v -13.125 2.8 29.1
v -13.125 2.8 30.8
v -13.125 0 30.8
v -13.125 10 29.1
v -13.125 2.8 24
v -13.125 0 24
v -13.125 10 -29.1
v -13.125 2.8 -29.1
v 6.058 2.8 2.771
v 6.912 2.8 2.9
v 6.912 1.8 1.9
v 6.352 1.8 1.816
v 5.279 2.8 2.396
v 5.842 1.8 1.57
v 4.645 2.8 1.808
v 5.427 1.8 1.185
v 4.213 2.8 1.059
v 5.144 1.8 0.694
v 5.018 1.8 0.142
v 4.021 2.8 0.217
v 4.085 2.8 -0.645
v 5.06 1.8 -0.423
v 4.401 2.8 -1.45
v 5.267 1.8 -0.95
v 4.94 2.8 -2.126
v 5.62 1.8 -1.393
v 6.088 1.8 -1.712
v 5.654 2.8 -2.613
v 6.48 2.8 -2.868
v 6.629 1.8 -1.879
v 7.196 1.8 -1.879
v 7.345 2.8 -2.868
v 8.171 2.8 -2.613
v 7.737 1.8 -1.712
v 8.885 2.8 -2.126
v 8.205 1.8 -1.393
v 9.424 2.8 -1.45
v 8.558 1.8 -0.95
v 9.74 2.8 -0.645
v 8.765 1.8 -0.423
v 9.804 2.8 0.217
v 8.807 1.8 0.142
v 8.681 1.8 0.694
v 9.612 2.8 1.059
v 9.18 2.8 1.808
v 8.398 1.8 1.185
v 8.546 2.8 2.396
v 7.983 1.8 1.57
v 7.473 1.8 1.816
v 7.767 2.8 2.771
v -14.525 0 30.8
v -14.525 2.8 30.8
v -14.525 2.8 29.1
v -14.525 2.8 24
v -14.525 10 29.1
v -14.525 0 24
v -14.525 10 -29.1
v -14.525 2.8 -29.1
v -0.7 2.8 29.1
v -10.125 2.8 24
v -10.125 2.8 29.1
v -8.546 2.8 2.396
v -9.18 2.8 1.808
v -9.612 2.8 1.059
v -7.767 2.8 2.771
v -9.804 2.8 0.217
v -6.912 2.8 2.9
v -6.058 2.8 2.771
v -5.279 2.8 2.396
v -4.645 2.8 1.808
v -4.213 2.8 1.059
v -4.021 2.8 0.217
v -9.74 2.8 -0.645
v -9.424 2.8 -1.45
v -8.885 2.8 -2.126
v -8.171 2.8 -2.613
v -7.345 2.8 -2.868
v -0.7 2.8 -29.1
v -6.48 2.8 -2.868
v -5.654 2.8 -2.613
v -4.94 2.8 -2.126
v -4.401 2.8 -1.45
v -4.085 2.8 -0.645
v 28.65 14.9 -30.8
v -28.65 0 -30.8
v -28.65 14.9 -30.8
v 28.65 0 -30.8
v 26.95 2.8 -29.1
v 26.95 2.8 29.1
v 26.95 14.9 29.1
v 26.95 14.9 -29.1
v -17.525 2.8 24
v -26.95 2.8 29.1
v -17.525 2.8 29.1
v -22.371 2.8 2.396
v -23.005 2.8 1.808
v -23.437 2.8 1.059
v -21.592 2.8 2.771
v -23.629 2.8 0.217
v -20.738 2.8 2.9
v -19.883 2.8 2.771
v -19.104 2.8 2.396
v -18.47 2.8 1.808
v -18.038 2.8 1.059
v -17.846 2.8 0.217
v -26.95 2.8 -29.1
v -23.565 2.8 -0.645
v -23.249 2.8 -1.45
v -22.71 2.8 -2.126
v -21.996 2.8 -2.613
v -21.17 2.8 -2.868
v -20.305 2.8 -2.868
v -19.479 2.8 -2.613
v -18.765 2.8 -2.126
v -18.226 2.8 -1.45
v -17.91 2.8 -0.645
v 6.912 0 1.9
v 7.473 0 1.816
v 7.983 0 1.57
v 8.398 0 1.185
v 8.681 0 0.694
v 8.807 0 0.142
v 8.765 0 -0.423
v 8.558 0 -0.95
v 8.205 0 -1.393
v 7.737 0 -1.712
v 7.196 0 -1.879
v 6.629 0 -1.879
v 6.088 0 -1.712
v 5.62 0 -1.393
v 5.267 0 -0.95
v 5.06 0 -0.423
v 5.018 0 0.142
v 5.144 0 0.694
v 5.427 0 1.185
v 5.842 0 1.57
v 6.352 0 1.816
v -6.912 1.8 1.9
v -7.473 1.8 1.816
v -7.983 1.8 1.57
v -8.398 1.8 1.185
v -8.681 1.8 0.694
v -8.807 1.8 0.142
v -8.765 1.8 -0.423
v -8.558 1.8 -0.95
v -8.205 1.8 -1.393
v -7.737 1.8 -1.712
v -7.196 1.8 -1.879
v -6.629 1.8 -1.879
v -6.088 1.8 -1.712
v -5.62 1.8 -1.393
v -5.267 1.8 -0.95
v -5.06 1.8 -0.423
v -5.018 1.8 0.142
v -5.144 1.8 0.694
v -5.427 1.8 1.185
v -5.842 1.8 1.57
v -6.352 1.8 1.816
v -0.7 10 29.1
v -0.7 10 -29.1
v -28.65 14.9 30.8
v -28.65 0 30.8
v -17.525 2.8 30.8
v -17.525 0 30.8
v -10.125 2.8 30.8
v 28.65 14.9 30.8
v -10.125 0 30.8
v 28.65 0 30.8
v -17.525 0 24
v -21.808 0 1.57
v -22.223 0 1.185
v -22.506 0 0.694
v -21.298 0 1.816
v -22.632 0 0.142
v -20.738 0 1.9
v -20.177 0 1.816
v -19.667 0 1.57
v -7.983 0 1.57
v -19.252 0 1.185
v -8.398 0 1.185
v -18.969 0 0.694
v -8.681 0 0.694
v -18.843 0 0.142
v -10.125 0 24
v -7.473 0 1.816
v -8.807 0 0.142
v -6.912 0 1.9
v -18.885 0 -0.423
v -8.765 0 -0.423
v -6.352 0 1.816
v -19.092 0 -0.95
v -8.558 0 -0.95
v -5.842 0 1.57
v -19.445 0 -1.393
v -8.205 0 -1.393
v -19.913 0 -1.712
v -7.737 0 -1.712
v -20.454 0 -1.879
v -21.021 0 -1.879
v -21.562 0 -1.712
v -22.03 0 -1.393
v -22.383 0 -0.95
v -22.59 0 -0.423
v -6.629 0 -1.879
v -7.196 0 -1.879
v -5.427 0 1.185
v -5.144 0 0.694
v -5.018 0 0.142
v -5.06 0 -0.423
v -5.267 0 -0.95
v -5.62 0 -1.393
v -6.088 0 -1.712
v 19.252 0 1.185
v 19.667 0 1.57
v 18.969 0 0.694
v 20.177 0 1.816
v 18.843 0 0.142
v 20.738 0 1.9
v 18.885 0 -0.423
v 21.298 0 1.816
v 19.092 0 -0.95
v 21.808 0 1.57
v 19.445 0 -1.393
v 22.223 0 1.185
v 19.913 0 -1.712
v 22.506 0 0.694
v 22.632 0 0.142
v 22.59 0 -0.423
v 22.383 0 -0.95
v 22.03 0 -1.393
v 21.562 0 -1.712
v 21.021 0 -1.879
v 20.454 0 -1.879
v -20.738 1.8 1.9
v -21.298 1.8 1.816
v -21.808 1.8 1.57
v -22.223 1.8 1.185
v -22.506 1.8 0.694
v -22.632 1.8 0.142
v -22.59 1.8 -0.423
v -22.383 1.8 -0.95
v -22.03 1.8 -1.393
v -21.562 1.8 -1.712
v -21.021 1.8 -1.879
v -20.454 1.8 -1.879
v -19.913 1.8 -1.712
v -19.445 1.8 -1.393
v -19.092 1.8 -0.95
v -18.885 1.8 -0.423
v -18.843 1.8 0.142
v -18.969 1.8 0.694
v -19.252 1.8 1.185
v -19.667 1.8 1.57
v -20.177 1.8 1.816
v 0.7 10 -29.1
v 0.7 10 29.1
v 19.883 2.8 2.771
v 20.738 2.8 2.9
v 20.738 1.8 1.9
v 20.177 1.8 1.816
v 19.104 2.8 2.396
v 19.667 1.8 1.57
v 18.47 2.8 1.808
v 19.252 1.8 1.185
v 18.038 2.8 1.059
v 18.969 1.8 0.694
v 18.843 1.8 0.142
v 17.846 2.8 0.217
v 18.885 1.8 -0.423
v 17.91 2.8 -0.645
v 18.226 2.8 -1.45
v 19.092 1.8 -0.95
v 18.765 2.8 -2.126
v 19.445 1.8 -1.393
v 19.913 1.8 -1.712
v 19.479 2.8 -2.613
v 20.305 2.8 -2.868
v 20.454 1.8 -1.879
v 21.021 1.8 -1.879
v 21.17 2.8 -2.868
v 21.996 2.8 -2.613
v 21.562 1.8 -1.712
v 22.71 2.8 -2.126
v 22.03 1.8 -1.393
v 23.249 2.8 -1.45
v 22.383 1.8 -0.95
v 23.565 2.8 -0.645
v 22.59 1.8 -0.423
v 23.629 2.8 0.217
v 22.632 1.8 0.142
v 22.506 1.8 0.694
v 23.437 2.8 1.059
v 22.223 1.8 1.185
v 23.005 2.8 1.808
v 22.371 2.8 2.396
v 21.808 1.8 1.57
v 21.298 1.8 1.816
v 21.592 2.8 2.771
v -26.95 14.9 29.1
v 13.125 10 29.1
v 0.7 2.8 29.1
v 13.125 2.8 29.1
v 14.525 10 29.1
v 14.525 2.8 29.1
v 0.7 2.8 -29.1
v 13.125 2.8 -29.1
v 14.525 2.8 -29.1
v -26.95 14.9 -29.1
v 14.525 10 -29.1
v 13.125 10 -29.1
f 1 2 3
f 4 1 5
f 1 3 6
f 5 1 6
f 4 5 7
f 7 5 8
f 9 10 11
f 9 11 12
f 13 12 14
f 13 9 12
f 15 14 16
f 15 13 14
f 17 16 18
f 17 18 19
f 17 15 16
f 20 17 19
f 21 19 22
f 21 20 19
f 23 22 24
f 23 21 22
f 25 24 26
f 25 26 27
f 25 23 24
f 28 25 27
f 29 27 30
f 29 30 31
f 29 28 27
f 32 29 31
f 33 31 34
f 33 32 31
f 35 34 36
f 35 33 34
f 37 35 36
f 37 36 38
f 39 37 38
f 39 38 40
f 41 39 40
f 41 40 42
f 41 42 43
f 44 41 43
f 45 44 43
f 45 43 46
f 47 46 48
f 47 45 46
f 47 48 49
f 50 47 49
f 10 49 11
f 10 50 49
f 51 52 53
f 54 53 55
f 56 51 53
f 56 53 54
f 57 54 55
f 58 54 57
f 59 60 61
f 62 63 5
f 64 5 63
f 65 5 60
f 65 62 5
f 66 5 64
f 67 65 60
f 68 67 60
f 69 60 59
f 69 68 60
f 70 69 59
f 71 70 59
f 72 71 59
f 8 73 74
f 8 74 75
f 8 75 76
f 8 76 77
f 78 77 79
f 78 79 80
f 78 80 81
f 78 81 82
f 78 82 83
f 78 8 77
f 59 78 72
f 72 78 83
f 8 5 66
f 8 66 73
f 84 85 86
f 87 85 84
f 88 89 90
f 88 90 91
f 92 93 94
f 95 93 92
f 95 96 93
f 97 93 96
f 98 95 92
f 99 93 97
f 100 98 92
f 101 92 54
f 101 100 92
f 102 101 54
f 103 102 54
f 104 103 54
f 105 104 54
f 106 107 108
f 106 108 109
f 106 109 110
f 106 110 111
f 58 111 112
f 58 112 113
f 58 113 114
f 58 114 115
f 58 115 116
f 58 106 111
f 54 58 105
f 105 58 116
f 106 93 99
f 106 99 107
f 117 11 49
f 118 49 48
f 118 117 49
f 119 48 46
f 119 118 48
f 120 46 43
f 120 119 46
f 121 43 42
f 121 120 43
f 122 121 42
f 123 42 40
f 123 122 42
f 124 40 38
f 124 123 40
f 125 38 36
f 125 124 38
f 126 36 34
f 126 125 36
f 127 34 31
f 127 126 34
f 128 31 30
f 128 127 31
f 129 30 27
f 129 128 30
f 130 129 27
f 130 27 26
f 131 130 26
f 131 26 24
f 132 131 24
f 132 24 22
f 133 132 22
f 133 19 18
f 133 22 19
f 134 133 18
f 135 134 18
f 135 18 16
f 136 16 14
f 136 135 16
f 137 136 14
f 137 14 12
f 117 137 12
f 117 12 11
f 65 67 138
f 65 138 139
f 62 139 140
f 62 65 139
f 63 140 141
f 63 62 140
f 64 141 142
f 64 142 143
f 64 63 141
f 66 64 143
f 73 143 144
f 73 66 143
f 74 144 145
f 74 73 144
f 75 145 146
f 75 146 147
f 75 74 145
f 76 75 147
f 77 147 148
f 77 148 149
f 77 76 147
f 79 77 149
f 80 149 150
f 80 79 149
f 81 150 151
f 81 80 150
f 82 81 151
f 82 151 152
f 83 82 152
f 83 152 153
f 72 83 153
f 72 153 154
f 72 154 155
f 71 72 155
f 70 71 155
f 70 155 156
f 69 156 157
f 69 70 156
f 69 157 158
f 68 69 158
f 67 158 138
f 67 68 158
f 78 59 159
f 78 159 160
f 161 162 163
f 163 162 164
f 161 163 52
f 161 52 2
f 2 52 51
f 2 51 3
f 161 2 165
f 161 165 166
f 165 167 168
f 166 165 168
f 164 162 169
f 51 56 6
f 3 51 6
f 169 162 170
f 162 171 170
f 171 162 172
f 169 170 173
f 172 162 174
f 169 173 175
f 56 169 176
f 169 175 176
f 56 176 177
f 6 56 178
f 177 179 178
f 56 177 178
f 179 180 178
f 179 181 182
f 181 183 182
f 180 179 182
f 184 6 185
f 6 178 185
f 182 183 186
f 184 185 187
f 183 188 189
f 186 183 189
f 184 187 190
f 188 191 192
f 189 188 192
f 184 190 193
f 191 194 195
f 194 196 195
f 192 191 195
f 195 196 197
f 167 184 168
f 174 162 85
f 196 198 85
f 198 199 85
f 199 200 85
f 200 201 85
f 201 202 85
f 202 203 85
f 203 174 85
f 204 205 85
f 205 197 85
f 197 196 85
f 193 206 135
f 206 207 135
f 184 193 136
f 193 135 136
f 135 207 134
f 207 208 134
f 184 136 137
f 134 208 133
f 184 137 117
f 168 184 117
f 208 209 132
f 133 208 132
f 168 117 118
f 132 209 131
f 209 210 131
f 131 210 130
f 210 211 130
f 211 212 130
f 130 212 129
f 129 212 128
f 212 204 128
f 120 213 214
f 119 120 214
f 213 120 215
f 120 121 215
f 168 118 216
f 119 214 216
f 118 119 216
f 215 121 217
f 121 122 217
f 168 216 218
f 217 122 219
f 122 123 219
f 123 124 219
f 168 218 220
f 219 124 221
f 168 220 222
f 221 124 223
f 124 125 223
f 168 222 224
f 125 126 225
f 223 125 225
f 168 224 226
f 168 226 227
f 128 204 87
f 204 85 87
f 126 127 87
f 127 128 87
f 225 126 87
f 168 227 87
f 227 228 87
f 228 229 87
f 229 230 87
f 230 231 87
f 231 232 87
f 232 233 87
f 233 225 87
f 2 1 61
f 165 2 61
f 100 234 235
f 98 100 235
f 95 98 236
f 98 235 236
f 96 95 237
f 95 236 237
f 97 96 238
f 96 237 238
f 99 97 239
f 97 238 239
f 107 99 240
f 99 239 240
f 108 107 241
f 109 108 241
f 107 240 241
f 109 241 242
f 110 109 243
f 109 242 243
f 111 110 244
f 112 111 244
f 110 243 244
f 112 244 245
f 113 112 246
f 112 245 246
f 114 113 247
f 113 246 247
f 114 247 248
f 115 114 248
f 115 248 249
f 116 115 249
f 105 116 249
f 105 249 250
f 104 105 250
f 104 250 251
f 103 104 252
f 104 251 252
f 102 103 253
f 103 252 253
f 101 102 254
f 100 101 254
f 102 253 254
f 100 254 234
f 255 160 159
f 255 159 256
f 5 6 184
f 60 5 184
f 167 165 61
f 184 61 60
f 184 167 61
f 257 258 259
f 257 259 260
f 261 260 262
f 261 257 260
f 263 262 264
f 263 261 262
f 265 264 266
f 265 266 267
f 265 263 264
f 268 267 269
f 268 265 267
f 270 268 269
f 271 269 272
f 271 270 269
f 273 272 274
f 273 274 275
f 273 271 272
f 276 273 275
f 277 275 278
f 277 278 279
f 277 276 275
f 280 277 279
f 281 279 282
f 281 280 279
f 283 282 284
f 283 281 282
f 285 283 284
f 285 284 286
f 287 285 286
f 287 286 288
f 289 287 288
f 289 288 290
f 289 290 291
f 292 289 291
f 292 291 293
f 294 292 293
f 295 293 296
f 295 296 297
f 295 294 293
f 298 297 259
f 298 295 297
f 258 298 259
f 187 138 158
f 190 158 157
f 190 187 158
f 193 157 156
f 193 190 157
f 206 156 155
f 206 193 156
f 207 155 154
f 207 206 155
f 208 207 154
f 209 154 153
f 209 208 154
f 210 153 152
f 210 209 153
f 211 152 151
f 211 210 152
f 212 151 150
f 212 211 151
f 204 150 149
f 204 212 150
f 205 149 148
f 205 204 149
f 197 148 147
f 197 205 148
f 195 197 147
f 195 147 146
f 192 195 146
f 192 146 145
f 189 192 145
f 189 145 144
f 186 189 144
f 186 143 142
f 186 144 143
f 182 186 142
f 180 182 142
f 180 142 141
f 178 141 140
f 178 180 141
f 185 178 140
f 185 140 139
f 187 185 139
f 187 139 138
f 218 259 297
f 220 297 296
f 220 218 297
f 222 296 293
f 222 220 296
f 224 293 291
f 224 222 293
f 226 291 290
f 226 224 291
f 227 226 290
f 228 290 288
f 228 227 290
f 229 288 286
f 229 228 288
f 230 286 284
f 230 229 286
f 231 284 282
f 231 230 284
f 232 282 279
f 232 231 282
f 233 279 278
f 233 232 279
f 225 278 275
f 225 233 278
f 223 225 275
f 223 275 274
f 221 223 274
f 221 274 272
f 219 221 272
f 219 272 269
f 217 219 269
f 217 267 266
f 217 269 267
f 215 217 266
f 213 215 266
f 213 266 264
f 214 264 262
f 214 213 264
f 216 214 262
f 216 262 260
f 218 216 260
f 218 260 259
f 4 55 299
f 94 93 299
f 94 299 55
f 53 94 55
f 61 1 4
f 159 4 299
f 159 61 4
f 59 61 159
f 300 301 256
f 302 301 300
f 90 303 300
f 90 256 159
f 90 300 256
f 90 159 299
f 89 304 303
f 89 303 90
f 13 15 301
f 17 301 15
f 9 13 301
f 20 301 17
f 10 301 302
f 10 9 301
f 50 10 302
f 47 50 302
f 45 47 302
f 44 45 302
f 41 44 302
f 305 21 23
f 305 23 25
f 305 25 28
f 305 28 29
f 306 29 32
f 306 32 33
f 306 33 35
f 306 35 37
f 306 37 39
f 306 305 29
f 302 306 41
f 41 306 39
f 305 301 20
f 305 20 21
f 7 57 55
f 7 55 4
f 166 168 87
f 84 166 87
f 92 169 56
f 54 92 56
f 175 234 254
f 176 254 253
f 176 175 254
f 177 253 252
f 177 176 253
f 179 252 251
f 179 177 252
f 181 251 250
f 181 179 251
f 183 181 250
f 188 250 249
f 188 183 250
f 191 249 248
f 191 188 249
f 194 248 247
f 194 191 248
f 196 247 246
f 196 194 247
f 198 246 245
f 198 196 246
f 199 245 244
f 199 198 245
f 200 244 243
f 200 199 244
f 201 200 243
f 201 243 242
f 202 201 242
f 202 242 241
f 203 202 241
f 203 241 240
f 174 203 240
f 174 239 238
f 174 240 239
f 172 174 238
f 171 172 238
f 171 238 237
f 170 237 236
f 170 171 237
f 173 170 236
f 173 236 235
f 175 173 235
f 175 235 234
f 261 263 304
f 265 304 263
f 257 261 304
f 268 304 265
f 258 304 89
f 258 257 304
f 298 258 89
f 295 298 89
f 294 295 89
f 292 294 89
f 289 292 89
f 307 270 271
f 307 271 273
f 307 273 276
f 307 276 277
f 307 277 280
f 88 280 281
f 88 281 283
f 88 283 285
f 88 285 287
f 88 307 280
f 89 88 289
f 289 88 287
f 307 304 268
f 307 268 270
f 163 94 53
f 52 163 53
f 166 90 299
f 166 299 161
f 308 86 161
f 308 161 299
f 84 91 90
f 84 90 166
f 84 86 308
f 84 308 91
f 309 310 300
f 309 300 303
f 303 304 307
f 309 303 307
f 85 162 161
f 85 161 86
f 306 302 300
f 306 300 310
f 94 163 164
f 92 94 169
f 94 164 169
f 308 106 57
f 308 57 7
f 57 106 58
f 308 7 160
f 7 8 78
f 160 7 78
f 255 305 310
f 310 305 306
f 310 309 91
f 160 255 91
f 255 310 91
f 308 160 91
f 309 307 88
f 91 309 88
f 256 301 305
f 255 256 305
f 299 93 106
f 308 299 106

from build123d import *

# Parameters (mm, degrees)
SKETCH_1_W          = 57.3
SKETCH_1_H          = 61.6
EXTRUDE_1_DEPTH     = 2.8
SKETCH_1_11_W       = 57.3
SKETCH_1_11_H       = 61.6
SKETCH_1_11_W_2     = 53.9
SKETCH_1_11_H_2     = 58.2
EXTRUDE_1_2_DEPTH   = 14.9
SKETCH_1_13_W       = 3
SKETCH_1_13_H       = 6.8
CUT_EXTRUDE_1_DEPTH = 2.8
SKETCH_1_14_W       = 1.4
SKETCH_1_14_H       = 61.6
EXTRUDE_2_DEPTH     = 10
SKETCH_1_15_R       = 1.9
CUT_EXTRUDE_2_DEPTH = 45.625917358
CHAMFER_1_SIZE      = 1


with BuildPart() as part:
    # 草图1 → Extrude 1 (new body)
    with BuildSketch(Plane(origin=(0, 0, 0), x_dir=(1, 0, 0), z_dir=(0, 1, 0))):
        Rectangle(SKETCH_1_W, SKETCH_1_H)
    extrude(amount=EXTRUDE_1_DEPTH)

    # 草图1<11> → Extrude 1 2 (add)
    with BuildSketch(Plane(origin=(0, 0, 0), x_dir=(1, 0, 0), z_dir=(0, 1, 0))):
        Rectangle(SKETCH_1_11_W, SKETCH_1_11_H)
        Rectangle(SKETCH_1_11_W_2, SKETCH_1_11_H_2, mode=Mode.SUBTRACT)
    extrude(amount=EXTRUDE_1_2_DEPTH)

    # 草图1<13> → 切除-拉伸1 (cut)
    with BuildSketch(Plane(origin=(0, 0, 0), x_dir=(1, 0, 0), z_dir=(0, 1, 0))):
        with Locations((-16.025, -27.4)):
            Rectangle(SKETCH_1_13_W, SKETCH_1_13_H)
        with Locations((-11.625, -27.4)):
            Rectangle(SKETCH_1_13_W, SKETCH_1_13_H)
    extrude(amount=CUT_EXTRUDE_1_DEPTH, mode=Mode.SUBTRACT)

    # 草图1<14> → 凸台-拉伸2 (add)
    with BuildSketch(Plane(origin=(0, 0, 0), x_dir=(1, 0, 0), z_dir=(0, 1, 0))):
        with Locations((-13.825, 0)):
            Rectangle(SKETCH_1_14_W, SKETCH_1_14_H)
        with Locations((13.825, 0)):
            Rectangle(SKETCH_1_14_W, SKETCH_1_14_H)
        Rectangle(SKETCH_1_14_W, SKETCH_1_14_H)
    extrude(amount=EXTRUDE_2_DEPTH)

    # 草图1<15> → 切除-拉伸2 (cut, through all)
    with BuildSketch(Plane(origin=(0, 0, 0), x_dir=(1, 0, 0), z_dir=(0, 1, 0))):
        with Locations(Location((-20.7375, 0, 0), (0, 0, 270))):
            Circle(SKETCH_1_15_R)
        with Locations(Location((-6.9125, 0, 0), (0, 0, 270))):
            Circle(SKETCH_1_15_R)
        with Locations(Location((6.9125, 0, 0), (0, 0, 270))):
            Circle(SKETCH_1_15_R)
        with Locations(Location((20.7375, 0, 0), (0, 0, 270))):
            Circle(SKETCH_1_15_R)
    extrude(amount=CUT_EXTRUDE_2_DEPTH, mode=Mode.SUBTRACT)

    # 倒角1
    chamfer_1_edges = [part.edges().sort_by_distance(p)[0] for p in [
        (-20.7375, 2.8, -1.9),
        (-6.9125, 2.8, -1.9),
        (6.9125, 2.8, -1.9),
        (20.7375, 2.8, -1.9),
    ]]
    chamfer(chamfer_1_edges, length=CHAMFER_1_SIZE)


solid = part.part
